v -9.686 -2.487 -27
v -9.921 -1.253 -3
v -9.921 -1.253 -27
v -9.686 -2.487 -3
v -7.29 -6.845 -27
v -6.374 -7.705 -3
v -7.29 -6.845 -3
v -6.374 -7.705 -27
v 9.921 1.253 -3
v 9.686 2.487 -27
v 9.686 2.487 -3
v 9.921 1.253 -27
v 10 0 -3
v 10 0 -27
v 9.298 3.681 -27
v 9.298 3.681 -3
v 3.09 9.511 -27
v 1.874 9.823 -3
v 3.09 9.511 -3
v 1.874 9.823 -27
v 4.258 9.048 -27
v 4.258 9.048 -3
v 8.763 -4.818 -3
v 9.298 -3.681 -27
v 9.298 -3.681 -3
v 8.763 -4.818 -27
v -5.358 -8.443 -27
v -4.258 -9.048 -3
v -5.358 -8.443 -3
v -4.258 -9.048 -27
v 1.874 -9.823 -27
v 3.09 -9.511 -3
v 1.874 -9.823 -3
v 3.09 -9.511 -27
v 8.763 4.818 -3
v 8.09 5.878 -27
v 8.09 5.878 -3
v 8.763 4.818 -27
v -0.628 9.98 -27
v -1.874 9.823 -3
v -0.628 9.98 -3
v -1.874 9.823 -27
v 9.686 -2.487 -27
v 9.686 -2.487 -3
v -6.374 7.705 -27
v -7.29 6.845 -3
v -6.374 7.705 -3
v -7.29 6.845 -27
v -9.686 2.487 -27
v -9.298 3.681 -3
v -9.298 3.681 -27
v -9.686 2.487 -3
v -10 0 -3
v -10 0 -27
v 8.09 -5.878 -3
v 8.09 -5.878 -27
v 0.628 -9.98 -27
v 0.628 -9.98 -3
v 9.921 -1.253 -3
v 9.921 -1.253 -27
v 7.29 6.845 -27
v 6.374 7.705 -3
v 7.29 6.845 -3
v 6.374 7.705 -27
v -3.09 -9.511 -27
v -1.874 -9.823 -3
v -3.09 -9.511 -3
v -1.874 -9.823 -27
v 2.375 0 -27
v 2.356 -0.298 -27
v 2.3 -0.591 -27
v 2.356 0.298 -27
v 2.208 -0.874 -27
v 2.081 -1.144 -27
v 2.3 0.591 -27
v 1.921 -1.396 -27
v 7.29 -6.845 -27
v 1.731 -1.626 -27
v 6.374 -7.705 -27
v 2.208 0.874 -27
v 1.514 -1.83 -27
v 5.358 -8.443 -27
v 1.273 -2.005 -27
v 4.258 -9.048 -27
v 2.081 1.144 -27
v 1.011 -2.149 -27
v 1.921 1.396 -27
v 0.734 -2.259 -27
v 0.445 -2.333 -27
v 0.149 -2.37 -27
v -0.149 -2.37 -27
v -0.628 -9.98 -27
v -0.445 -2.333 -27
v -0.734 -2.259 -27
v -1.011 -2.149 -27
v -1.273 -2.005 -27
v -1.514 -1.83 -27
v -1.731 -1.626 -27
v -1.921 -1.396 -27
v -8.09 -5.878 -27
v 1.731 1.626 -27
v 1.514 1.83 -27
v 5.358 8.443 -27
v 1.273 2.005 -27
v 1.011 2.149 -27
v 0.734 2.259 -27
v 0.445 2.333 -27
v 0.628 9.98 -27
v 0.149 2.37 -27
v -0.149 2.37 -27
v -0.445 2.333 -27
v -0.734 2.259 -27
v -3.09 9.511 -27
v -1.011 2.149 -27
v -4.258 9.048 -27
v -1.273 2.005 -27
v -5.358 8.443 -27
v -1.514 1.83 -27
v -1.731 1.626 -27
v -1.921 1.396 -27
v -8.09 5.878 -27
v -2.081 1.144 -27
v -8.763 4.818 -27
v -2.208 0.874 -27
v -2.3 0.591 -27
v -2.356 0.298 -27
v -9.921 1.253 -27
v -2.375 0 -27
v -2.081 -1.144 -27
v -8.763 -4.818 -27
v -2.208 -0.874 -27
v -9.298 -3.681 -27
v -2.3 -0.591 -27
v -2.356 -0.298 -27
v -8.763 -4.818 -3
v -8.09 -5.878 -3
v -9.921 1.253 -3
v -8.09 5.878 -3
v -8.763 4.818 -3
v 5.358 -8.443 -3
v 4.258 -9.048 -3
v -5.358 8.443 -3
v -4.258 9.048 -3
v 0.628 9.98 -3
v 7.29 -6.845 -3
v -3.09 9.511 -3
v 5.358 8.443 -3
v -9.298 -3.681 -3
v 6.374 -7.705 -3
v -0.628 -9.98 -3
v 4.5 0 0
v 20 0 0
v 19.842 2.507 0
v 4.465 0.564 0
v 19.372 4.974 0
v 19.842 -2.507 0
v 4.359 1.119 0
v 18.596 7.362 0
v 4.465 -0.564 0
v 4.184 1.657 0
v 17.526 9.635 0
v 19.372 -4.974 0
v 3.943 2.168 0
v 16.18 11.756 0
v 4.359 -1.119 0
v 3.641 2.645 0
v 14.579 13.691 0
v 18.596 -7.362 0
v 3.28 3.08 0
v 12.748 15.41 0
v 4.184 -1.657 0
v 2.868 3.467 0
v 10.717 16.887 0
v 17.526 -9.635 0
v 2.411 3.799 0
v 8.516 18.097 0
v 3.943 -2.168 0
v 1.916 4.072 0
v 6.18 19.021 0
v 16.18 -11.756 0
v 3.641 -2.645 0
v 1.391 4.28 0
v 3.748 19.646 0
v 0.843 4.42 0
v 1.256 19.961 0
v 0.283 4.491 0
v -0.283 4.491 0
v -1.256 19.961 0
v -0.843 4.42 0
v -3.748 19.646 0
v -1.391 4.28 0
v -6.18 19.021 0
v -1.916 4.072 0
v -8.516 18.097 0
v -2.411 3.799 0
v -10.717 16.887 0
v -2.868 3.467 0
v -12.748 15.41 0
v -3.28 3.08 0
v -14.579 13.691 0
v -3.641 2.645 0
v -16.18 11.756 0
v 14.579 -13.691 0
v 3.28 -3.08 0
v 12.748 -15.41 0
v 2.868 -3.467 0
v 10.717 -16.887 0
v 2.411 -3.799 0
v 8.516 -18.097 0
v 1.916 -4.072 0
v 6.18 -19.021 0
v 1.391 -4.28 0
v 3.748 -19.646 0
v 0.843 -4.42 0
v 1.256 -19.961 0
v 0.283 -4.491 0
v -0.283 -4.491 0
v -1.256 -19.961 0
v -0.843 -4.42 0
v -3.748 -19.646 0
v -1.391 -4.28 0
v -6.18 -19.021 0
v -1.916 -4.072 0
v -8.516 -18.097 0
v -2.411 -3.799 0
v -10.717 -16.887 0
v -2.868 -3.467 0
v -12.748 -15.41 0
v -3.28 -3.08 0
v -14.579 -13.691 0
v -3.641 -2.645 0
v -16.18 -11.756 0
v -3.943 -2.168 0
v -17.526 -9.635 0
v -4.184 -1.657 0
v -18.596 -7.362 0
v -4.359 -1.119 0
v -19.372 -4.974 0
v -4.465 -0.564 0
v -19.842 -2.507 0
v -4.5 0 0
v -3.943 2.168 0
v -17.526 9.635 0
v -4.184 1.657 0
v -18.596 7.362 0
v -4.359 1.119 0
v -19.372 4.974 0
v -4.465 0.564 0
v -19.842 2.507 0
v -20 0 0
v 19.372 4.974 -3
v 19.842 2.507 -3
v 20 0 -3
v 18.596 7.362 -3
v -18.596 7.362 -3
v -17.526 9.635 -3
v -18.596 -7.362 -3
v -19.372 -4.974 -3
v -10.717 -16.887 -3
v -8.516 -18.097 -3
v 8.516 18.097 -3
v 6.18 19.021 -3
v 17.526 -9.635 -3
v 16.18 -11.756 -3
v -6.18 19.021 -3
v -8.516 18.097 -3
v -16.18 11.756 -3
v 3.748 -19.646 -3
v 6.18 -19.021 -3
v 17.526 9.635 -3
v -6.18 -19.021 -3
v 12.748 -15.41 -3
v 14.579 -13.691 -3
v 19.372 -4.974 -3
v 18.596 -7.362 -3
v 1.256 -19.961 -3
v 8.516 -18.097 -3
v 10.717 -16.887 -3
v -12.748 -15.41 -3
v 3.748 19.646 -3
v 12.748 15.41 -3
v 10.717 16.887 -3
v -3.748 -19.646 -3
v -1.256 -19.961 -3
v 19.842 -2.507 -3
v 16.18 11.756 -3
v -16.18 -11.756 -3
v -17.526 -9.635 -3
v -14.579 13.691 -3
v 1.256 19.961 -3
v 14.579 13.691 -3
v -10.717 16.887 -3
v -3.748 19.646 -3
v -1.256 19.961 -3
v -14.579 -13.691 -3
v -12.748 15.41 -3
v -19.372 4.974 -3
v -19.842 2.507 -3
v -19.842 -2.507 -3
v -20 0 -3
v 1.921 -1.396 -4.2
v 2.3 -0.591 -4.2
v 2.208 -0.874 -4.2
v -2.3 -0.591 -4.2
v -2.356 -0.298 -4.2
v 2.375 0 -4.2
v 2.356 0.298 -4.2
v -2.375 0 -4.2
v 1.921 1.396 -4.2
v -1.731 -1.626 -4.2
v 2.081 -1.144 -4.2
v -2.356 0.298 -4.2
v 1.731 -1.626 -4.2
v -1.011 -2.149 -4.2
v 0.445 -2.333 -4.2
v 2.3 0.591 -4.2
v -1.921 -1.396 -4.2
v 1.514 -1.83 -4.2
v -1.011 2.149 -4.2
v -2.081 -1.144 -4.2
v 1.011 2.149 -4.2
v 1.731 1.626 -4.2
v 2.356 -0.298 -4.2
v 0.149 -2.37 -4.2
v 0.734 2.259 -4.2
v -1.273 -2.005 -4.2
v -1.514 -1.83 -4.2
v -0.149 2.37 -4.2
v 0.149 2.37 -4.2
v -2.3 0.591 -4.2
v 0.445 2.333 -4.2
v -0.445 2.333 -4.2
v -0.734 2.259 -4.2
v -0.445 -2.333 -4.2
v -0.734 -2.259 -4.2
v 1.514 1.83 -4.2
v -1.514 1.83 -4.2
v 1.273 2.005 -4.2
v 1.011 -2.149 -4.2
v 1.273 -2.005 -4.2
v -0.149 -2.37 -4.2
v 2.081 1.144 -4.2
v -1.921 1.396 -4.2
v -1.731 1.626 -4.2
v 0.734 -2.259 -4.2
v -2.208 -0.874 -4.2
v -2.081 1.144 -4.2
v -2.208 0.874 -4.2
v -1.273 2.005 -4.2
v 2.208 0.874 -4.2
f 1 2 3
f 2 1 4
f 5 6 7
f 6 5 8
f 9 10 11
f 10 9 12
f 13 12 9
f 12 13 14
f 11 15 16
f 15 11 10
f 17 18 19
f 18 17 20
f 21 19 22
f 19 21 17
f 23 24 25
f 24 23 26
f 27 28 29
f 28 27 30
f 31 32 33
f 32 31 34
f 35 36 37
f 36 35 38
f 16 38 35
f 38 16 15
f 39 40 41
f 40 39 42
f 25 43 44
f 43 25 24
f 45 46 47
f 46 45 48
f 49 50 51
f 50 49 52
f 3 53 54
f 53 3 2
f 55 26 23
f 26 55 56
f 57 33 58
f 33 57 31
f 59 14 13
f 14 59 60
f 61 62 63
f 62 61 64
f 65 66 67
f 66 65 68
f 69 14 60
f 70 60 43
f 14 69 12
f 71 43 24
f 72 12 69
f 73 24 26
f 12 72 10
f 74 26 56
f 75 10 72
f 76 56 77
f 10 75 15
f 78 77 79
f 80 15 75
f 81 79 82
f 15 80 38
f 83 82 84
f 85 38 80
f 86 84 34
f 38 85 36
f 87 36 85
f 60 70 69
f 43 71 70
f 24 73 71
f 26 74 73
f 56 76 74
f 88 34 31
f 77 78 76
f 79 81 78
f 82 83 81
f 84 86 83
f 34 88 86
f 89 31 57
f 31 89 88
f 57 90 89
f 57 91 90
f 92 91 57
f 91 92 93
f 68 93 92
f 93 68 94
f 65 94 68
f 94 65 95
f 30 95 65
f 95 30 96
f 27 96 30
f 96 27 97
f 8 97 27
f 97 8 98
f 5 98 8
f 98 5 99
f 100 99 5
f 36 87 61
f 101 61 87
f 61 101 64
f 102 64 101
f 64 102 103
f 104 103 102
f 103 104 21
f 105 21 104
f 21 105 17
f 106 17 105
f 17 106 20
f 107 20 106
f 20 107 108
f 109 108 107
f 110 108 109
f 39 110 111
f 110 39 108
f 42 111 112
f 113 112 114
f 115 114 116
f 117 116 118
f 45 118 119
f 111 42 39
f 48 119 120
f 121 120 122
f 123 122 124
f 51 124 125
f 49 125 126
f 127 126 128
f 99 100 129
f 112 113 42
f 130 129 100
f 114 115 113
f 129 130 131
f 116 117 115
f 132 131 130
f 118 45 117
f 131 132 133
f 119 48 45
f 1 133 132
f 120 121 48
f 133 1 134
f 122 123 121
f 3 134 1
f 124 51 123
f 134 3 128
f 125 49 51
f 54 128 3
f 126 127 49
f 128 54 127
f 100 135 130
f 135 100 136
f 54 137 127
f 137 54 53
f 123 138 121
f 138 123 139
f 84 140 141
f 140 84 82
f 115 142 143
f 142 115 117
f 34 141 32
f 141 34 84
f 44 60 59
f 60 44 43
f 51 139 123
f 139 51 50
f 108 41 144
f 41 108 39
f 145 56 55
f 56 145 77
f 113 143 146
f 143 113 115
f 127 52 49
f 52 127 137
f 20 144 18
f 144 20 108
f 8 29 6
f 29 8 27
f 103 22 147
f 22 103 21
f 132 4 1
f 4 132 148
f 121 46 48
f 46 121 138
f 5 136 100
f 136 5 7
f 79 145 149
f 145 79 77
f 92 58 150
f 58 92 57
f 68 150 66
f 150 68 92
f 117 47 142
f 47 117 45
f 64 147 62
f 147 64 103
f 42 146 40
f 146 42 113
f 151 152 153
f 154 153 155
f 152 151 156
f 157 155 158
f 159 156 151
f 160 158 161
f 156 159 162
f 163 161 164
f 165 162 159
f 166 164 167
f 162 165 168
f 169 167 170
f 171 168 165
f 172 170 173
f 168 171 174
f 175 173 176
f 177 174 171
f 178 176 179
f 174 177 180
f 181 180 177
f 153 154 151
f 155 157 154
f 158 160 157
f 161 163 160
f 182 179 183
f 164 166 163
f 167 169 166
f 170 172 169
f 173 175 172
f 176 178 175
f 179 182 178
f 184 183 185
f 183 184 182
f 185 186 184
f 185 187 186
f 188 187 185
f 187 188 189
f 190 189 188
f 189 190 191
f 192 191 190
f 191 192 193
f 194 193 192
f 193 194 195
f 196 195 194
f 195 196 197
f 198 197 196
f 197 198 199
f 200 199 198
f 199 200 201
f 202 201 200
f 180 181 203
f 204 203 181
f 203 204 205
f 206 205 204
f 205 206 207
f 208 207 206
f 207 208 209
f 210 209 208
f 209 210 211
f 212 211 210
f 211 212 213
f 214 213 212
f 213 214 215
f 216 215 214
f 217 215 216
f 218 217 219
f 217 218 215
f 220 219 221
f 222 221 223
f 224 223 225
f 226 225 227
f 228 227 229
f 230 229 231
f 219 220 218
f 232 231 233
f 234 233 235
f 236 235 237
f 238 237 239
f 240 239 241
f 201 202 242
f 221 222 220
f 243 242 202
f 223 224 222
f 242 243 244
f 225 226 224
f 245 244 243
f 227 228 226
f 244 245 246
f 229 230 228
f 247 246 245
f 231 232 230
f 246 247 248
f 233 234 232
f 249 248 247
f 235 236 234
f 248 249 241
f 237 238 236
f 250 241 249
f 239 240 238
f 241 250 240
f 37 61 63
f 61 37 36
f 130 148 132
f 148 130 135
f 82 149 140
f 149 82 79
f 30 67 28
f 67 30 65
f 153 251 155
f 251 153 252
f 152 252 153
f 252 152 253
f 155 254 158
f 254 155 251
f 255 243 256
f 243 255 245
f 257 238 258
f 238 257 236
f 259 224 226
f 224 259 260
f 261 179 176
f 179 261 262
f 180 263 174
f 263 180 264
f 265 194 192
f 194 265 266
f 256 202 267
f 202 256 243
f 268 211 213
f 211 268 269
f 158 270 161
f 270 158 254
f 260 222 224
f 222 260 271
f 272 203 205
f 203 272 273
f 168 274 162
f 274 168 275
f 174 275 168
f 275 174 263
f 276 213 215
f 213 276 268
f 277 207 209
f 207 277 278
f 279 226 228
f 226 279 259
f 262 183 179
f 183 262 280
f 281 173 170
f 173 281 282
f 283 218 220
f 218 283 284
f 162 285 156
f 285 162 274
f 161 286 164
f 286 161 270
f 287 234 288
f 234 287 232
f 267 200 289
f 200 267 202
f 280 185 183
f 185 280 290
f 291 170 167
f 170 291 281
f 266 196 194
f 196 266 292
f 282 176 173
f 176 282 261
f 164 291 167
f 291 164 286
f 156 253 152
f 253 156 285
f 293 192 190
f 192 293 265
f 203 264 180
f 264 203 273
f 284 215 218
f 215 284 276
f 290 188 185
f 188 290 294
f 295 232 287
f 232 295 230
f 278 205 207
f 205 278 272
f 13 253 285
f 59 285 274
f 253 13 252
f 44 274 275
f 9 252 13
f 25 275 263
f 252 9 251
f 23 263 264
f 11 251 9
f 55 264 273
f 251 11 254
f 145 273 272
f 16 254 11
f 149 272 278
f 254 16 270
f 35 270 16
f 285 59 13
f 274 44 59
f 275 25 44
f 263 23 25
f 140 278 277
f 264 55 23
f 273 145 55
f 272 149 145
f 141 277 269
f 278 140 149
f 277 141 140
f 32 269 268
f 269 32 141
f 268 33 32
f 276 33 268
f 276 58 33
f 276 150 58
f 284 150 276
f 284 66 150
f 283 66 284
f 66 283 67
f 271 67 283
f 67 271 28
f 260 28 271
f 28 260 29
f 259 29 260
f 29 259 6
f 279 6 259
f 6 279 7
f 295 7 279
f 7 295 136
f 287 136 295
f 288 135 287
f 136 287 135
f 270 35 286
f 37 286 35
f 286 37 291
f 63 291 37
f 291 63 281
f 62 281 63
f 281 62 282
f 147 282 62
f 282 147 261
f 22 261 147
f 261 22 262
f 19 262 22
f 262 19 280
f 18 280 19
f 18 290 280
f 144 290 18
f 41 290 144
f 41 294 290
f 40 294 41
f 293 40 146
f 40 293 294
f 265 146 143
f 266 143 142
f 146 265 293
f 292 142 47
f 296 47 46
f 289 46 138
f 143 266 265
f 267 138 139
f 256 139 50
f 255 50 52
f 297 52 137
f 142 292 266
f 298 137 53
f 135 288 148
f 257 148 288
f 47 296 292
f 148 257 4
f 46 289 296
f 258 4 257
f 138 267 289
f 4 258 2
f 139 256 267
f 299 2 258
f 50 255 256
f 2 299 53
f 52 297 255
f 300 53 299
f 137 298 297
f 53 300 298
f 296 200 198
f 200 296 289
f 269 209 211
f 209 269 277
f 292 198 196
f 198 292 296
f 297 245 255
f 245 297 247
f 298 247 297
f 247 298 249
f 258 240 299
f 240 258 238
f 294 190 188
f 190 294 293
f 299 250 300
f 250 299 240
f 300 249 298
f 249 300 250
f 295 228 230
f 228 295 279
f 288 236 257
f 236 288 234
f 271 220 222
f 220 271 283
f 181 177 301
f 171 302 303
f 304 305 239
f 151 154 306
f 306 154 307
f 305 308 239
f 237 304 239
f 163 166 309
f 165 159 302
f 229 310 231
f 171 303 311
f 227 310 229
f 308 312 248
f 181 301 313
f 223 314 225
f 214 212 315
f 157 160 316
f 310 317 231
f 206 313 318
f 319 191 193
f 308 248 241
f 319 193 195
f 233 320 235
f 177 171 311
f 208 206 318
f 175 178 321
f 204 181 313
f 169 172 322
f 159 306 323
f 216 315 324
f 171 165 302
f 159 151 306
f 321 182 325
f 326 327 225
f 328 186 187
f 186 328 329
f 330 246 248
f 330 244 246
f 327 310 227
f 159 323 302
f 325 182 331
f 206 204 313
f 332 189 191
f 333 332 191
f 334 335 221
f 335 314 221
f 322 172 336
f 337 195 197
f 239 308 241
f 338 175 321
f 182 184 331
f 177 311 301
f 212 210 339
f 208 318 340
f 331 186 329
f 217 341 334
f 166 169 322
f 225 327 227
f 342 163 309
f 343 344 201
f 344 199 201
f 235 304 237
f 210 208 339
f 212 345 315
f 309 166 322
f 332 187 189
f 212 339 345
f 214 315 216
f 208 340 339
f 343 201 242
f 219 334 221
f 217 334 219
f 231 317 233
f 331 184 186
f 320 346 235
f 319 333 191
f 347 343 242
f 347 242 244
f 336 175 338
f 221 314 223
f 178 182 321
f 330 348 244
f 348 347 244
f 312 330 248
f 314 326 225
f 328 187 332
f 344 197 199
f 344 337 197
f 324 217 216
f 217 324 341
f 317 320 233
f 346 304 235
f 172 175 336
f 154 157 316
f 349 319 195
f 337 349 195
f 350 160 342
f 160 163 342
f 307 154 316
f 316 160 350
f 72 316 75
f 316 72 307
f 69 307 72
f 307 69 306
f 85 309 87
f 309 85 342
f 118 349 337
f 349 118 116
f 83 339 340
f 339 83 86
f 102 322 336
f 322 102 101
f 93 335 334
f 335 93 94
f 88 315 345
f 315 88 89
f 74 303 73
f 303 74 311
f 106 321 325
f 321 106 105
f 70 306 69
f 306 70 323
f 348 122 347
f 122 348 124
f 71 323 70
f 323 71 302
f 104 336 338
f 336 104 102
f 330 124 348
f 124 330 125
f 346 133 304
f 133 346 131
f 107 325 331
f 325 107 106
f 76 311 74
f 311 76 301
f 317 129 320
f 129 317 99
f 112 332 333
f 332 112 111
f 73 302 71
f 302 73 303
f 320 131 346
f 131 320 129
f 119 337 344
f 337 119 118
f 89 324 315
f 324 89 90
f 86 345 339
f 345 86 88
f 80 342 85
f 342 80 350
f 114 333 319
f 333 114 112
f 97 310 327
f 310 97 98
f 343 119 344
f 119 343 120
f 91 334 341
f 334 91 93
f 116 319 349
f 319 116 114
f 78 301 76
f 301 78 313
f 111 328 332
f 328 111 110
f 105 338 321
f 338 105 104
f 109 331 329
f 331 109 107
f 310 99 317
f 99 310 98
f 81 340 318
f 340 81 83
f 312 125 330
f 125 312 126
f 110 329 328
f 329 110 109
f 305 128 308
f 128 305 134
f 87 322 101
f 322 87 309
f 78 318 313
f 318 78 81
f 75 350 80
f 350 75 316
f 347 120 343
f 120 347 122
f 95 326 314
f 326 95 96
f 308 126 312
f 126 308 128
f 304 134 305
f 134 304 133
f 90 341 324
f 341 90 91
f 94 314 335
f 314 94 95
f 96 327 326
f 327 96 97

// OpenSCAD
$fn = 50;


difference() {
	union() {
		translate(v = [0, 0, -27.0000000000]) {
			cylinder(h = 27, r = 10.0000000000);
		}
		translate(v = [0, 0, -3.0000000000]) {
			cylinder(h = 3, r = 20.0000000000);
		}
	}
	union() {
		translate(v = [0, 0, 0]) {
			rotate(a = [0, 0, 0]) {
				difference() {
					union() {
						#translate(v = [0, 0, -27.0000000000]) {
							cylinder(h = 27, r = 2.2500000000);
						}
						#translate(v = [0, 0, -4.2000000000]) {
							cylinder(h = 4.2000000000, r1 = 2.3750000000, r2 = 4.5000000000);
						}
						#translate(v = [0, 0, -27.0000000000]) {
							cylinder(h = 27, r = 2.3750000000);
						}
						#translate(v = [0, 0, -27.0000000000]) {
							cylinder(h = 27, r = 2.2500000000);
						}
					}
					union();
				}
			}
		}
	}
}
